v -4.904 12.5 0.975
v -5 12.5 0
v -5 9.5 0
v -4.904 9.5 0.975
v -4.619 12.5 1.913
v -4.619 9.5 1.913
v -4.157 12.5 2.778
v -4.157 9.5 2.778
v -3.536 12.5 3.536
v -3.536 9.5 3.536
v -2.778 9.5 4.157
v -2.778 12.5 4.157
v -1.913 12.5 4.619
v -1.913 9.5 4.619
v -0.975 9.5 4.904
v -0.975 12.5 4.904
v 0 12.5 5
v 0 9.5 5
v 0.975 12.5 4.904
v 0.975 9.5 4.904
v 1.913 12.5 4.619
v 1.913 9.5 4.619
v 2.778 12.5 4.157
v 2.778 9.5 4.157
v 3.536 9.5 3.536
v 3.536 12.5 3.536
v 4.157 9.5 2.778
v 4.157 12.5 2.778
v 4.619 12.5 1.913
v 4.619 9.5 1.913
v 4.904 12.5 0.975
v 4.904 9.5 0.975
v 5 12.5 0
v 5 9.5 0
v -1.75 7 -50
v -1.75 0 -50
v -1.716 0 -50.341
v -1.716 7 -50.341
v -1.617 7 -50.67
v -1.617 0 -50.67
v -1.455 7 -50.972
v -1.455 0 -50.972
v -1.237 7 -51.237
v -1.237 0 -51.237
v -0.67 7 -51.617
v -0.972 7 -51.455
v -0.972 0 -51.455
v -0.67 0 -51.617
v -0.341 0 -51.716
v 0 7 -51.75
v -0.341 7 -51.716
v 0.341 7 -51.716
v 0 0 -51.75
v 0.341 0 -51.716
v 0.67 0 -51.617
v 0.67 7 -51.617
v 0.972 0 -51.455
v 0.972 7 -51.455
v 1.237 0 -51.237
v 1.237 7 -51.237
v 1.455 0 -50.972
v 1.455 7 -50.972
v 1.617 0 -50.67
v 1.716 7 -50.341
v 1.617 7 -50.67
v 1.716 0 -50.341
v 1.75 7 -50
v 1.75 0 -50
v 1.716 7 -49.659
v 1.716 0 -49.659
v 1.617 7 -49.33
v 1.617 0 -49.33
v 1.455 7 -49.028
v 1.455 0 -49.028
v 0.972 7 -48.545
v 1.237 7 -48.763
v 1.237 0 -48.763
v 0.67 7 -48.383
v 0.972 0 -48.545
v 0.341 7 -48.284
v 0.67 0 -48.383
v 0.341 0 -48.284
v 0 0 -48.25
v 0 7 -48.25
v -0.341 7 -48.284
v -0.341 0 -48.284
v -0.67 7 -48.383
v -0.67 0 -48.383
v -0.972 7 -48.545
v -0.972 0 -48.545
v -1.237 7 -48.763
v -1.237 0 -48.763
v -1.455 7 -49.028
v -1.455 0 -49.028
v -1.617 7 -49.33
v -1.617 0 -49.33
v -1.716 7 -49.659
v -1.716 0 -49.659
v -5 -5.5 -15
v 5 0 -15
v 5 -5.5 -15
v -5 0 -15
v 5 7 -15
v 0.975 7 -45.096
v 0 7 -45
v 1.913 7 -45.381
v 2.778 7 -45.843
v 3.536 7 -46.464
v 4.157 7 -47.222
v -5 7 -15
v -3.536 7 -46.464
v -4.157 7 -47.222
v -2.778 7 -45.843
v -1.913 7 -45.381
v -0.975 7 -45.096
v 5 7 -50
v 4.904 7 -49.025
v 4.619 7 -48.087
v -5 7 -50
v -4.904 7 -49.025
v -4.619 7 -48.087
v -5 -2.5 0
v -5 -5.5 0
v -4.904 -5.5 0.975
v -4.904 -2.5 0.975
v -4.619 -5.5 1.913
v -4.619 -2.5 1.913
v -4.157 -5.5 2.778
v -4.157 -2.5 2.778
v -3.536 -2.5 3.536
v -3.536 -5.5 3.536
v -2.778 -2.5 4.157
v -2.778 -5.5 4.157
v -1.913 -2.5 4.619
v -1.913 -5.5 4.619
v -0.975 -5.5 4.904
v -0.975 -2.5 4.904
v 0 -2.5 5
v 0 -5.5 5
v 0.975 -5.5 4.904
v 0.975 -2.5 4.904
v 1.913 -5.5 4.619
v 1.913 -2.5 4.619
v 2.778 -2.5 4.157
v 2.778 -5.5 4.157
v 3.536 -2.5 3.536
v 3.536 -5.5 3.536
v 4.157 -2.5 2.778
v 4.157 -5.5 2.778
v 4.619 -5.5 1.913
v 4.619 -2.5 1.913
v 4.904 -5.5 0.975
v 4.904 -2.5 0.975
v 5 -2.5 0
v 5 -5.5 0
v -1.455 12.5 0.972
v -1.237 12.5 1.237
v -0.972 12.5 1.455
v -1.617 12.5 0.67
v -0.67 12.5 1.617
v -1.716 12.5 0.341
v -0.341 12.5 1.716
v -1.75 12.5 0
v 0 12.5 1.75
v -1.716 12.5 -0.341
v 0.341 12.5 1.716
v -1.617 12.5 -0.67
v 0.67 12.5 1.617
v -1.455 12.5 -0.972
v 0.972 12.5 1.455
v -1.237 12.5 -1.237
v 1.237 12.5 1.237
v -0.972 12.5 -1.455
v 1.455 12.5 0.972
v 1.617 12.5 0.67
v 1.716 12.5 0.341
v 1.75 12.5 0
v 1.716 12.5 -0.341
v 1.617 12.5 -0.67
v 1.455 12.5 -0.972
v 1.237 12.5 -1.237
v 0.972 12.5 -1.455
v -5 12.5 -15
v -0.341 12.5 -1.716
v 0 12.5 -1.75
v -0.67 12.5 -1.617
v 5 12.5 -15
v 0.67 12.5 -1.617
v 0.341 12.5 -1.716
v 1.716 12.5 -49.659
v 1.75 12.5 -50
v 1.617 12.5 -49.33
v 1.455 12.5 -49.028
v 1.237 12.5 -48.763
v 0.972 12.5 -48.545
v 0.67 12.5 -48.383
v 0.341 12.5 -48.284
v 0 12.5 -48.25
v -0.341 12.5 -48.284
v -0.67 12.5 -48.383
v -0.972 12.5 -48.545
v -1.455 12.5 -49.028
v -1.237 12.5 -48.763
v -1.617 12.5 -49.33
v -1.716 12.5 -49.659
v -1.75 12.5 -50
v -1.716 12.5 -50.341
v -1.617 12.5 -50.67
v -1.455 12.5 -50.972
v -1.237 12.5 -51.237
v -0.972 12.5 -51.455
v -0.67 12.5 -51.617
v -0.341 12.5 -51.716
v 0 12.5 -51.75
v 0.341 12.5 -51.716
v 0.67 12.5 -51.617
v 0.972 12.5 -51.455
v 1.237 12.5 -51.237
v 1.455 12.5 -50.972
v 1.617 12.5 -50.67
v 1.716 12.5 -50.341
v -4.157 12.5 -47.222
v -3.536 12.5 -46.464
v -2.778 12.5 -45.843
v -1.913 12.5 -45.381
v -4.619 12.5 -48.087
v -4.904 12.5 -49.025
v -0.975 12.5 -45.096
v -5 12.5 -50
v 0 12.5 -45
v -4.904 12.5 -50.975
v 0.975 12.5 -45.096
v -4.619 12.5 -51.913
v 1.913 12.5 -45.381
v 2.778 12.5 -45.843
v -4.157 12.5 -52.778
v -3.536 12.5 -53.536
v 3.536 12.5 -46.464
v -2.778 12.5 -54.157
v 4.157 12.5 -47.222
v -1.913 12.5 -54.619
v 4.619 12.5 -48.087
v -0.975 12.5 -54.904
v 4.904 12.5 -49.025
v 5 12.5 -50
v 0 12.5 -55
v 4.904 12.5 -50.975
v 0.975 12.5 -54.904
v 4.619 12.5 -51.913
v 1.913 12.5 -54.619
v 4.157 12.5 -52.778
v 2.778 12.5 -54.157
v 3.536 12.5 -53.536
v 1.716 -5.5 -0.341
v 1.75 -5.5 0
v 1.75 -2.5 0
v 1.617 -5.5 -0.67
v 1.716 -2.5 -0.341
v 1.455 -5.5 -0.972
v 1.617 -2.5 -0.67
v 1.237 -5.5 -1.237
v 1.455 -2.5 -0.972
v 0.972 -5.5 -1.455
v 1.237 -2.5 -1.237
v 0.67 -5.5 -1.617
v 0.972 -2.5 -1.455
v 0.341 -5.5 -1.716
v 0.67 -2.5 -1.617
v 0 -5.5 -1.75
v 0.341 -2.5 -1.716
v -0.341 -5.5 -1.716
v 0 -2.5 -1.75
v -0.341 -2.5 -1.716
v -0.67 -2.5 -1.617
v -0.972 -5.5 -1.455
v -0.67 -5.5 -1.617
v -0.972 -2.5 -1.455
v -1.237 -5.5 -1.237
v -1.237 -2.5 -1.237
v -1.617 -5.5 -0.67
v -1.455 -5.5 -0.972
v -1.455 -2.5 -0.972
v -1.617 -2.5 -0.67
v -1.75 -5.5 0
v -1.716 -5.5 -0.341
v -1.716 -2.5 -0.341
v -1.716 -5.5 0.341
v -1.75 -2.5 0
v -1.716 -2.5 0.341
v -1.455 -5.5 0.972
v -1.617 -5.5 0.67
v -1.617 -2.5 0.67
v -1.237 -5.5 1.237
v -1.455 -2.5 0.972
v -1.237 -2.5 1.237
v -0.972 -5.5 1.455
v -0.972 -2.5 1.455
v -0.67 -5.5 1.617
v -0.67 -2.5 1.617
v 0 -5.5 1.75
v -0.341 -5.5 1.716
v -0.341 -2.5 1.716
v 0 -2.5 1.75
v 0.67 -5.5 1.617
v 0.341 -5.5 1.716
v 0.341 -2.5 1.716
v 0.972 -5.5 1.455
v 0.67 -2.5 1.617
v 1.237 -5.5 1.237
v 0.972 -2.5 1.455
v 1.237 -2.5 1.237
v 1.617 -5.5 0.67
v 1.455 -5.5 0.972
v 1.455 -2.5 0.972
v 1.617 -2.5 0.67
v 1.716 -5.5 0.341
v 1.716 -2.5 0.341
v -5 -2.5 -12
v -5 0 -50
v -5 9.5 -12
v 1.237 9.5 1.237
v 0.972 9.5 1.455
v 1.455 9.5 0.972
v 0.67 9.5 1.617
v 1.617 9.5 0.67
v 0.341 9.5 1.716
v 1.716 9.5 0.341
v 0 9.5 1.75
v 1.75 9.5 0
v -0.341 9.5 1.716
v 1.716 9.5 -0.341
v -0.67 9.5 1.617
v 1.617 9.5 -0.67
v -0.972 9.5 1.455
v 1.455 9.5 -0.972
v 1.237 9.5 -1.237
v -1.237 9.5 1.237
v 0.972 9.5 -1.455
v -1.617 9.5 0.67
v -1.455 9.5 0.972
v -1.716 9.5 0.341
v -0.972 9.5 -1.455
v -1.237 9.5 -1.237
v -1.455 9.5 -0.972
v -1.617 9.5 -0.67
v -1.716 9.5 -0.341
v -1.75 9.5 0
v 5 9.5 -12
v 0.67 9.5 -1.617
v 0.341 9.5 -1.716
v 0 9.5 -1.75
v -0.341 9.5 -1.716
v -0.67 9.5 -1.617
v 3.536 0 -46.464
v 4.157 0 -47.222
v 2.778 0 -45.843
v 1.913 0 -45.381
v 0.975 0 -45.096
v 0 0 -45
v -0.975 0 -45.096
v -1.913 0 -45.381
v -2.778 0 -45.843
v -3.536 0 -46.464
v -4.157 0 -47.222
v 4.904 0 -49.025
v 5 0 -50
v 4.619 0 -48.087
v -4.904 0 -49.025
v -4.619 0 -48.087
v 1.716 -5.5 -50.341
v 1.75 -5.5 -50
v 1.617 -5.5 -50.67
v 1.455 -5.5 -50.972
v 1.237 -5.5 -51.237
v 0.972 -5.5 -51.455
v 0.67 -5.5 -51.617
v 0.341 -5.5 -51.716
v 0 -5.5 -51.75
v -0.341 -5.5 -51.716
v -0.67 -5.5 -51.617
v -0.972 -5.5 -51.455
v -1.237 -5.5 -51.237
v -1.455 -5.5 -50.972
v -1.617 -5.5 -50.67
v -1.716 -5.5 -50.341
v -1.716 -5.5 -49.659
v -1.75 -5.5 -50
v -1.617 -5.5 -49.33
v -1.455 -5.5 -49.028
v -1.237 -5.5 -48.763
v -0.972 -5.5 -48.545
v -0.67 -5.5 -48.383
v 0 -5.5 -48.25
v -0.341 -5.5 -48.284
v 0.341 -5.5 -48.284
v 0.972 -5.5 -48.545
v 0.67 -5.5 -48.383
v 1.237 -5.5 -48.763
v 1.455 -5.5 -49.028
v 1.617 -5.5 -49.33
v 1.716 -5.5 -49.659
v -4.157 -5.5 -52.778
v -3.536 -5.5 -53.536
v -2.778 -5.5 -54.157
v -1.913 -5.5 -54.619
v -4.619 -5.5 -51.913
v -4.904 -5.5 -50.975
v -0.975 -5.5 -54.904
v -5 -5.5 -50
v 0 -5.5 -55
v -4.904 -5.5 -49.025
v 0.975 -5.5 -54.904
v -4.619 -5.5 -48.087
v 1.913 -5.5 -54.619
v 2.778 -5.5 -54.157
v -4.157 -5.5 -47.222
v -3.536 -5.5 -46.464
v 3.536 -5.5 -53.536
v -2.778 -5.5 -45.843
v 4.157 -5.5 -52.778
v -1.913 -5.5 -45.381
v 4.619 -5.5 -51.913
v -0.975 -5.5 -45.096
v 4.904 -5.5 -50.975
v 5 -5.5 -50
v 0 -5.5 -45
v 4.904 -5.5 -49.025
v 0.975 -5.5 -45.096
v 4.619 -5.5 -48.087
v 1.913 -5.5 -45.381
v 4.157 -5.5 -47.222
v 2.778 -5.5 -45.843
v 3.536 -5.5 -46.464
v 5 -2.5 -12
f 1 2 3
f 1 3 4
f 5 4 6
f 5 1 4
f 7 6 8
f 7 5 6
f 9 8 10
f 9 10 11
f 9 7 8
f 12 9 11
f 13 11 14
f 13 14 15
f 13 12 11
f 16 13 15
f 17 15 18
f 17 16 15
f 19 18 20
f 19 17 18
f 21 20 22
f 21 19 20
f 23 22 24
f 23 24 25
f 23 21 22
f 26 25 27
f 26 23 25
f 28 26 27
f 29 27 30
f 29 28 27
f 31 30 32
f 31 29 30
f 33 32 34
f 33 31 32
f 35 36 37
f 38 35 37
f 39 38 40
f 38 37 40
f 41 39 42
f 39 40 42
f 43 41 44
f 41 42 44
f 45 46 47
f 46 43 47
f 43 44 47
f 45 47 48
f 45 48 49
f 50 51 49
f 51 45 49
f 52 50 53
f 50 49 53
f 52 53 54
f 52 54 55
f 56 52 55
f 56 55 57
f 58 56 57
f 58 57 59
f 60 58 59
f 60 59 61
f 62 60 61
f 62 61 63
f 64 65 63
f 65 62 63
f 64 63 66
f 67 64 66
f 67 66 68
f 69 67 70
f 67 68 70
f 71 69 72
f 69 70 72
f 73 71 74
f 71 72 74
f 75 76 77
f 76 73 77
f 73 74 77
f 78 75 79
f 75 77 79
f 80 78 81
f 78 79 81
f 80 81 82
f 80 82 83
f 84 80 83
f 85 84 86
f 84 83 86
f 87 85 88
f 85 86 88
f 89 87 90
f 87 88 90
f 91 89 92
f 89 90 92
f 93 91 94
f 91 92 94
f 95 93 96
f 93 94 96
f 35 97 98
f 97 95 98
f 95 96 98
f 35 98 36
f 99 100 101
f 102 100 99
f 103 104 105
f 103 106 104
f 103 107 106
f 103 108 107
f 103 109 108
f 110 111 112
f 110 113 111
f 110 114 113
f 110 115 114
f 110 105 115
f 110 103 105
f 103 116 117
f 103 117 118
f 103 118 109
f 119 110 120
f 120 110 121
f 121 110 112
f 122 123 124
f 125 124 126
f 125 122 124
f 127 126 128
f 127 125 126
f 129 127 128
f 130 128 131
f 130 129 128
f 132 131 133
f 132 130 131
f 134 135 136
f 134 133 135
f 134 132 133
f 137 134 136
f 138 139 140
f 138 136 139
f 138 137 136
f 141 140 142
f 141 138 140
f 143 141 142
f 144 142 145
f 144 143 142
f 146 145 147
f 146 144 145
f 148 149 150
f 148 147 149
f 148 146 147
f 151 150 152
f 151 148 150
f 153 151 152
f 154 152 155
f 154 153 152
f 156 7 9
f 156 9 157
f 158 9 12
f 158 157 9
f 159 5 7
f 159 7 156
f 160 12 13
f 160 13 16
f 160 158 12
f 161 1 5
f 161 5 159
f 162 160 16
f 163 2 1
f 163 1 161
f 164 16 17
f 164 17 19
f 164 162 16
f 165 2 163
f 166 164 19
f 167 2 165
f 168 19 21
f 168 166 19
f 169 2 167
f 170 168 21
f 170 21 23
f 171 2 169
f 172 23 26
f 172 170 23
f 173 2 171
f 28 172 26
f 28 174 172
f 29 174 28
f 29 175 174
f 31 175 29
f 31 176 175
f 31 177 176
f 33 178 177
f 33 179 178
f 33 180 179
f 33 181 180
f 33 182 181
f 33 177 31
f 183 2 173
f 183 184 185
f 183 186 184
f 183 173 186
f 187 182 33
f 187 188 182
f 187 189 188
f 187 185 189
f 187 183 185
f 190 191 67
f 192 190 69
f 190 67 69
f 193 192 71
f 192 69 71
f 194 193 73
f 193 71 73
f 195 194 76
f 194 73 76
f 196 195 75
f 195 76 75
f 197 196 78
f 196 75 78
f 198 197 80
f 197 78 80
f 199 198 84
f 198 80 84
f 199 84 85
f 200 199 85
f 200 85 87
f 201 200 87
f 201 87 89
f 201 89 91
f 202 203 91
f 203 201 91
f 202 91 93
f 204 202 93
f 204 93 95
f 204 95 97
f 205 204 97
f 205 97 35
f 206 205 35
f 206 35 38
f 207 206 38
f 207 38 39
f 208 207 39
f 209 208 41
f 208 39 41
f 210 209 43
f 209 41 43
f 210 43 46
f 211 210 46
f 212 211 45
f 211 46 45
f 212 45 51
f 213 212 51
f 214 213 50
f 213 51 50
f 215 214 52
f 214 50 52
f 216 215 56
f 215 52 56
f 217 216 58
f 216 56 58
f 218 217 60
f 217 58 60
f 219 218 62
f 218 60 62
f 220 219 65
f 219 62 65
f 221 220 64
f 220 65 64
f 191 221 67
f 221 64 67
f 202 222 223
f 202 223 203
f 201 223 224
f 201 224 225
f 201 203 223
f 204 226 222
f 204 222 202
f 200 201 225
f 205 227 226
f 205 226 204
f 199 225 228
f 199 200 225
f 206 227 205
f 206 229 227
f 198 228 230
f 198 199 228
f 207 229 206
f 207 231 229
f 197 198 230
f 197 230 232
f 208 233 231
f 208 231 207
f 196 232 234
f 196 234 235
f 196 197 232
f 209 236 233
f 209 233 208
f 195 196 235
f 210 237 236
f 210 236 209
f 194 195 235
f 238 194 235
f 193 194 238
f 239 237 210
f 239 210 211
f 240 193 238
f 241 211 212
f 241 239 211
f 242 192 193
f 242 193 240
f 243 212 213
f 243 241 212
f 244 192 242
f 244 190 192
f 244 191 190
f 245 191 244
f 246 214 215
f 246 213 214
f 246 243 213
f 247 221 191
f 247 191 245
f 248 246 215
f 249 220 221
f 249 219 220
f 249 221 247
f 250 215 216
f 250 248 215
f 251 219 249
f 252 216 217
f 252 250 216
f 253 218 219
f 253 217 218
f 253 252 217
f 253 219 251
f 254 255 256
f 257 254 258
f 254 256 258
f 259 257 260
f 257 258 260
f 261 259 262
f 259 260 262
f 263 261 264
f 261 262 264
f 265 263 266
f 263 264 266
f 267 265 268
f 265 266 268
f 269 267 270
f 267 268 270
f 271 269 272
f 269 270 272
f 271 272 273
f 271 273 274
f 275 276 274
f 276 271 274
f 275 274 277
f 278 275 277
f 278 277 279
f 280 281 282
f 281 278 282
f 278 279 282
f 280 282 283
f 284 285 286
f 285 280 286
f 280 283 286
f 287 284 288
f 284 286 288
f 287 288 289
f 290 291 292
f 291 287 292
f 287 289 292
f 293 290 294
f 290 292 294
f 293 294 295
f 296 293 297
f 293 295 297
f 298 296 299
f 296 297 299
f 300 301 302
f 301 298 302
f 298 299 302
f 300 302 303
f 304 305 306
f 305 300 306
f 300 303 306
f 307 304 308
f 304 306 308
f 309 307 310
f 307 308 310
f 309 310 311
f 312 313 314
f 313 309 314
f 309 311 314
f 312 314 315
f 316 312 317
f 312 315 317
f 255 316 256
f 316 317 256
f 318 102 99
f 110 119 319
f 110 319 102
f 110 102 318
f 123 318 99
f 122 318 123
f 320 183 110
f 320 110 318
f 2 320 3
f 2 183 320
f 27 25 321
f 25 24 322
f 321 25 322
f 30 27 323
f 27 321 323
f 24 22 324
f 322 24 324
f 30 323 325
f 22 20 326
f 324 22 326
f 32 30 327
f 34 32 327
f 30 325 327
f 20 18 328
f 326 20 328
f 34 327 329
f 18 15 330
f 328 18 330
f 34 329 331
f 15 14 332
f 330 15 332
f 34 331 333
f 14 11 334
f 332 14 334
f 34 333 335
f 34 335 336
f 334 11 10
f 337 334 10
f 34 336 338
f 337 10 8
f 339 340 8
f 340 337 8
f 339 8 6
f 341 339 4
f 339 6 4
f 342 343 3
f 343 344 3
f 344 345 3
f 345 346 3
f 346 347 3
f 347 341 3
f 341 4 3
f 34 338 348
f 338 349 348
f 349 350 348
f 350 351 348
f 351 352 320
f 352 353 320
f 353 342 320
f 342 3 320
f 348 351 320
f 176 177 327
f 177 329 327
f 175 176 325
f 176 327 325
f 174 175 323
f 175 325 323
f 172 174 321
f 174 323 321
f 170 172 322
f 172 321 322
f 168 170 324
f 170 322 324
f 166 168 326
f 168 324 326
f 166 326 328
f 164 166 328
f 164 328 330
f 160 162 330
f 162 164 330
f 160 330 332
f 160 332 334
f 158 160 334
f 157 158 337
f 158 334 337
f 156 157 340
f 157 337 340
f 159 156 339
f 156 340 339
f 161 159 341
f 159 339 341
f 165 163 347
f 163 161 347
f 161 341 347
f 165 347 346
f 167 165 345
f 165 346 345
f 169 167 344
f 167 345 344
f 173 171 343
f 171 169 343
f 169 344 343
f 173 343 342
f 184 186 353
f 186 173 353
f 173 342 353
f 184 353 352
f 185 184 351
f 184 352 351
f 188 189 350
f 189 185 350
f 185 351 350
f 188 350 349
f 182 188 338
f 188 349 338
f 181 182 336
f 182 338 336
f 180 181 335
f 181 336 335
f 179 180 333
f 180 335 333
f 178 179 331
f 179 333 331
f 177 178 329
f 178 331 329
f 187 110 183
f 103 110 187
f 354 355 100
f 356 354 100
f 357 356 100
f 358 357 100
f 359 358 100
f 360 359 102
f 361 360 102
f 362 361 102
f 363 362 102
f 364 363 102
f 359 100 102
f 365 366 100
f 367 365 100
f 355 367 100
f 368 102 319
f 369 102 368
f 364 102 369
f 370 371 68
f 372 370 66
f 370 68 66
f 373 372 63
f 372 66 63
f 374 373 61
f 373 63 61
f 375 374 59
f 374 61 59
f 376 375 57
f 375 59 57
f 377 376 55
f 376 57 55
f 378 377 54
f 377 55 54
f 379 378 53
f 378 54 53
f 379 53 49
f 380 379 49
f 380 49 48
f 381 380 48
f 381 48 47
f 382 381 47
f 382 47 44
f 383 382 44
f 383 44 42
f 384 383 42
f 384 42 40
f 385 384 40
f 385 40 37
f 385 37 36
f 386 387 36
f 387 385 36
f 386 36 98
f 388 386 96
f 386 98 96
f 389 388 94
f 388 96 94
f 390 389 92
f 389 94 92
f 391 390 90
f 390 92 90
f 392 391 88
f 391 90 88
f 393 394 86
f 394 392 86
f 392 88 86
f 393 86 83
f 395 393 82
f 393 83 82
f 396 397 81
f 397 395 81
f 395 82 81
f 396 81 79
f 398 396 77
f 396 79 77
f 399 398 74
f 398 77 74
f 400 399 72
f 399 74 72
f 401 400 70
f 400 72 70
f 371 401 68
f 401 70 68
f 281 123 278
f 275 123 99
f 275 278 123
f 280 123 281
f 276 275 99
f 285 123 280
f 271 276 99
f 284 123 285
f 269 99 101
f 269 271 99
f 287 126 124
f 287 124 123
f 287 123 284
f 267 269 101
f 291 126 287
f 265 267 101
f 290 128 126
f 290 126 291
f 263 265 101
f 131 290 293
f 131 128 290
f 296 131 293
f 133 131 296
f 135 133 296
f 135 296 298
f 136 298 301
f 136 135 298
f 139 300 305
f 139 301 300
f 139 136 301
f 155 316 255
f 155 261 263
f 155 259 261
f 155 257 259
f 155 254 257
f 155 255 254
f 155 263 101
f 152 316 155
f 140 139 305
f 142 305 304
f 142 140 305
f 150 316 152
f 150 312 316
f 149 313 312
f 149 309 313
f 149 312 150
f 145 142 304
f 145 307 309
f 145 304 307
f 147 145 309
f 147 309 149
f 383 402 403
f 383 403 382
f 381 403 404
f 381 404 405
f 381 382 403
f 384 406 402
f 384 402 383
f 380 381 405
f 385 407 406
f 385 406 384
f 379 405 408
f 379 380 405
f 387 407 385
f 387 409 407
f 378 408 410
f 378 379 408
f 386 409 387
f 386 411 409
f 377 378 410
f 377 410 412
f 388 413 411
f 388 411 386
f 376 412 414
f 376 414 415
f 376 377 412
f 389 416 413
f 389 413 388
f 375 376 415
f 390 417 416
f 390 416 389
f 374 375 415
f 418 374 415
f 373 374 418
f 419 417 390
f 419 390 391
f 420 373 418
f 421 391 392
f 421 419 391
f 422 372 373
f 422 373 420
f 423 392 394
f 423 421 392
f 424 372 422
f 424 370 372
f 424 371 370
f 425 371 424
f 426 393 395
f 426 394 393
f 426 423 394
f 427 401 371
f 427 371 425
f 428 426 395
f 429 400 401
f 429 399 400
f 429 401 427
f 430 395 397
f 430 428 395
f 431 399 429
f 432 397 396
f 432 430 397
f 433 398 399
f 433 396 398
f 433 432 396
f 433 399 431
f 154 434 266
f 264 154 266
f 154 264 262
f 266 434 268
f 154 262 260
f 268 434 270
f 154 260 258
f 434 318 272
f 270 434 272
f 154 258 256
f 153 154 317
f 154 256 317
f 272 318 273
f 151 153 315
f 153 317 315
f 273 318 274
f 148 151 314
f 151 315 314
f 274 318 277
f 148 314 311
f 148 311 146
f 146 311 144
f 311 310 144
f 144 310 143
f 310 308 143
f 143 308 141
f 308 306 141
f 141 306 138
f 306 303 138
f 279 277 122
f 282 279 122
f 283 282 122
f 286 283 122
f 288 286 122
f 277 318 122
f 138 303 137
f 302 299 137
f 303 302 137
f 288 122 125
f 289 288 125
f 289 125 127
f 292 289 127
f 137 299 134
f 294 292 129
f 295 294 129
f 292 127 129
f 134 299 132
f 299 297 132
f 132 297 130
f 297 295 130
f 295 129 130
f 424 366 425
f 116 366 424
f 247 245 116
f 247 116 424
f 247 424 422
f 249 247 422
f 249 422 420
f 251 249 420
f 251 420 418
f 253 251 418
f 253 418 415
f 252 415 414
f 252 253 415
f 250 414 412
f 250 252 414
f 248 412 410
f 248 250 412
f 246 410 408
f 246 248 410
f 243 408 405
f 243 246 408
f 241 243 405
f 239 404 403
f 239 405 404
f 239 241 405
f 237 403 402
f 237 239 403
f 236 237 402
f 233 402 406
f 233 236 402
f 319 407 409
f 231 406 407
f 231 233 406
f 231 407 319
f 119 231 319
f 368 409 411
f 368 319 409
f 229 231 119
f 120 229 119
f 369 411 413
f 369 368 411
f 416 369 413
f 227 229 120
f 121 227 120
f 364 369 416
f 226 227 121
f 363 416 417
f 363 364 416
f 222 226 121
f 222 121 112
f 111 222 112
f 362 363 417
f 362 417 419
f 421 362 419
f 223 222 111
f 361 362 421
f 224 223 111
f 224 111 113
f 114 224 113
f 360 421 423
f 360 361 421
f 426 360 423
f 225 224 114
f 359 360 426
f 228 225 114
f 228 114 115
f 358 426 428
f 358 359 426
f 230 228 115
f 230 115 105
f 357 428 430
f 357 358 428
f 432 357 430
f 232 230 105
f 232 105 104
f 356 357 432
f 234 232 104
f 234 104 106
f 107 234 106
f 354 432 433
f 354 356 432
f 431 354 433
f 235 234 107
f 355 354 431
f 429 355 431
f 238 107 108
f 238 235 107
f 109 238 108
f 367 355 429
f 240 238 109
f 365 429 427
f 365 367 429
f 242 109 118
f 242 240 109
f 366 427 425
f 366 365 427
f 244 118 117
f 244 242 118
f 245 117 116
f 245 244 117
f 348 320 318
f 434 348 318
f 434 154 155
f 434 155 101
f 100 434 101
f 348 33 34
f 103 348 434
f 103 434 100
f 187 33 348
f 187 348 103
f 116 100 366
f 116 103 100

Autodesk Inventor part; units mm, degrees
ref_plane "YZ Plane" through (0, 0, 0) normal (1, 0, 0) x (0, 1, 0)
ref_plane "XY Plane" through (0, 0, 0) normal (0, 0, 1) x (1, 0, 0)
sketch "草圖1" plane through (0, 0, 0) normal (0, 1, 0) x (-1, 0, 0)
  circle A0 centre (0, 0) radius 1.75
  arc A1 (5, 0) -> (-5, 0) centre (0, 0) ccw
  circle A2 centre (0, -50) radius 1.75
  arc A3 (-5, -50) -> (5, -50) centre (0, -50) ccw
  line L0 (5, 0) -> (5, -50)
  line L1 (-5, 0) -> (-5, -50)
  dimension "d1" = 3.5
  dimension "d2" = 10
  dimension "d3" = 3.5
  dimension "d4" = 10
  dimension "d36" = 50
extrude "擠出1" add sketch "草圖1" along normal blind 7
sketch "草圖2" plane through (0, 7, 0) normal (0, 1, 0) x (1, 0, 0)
  line L0 (0, 0) -> (0, 15) construction
  line L1 (-5, 50) -> (-5, 0) projected
  line L2 (5, 0) -> (5, 50) projected
  arc A0 (-5, 0) -> (5, 0) centre (0, 0) ccw projected
  circle A1 centre (0, 0) radius 1.75 projected
  line L3 (-5, 15) -> (5, 15)
  point P0 (-5, 9)
  point P1 (5, 9)
  dimension "d7" = 15
sketch "草圖3" plane through (0, 0, 0) normal (0, -1, 0) x (1, 0, 0)
  line L0 (-5, -9) -> (5, -9) projected
  arc A0 (5, 0) -> (-5, 0) centre (0, 0) ccw projected
  line L1 (-5, -50) -> (-5, 0) projected
  circle A1 centre (0, 0) radius 1.75 projected
  line L2 (5, 0) -> (5, -50) projected
extrude "擠出2" add sketch "草圖2" along normal blind 5.5
sketch "草圖5" plane through (0, 7, 0) normal (0, 1, 0) x (1, 0, 0)
  circle A0 centre (0, 50) radius 1.75 projected
  circle A1 centre (0, 50) radius 5
  point P0 (0, 0)
  dimension "d17" = 10
extrude "擠出5" add sketch "草圖5" along normal blind 5.5
sketch "草圖6" plane through (0, 0, 0) normal (0, -1, 0) x (1, 0, 0)
  circle A0 centre (0, -50) radius 1.75 projected
  circle A1 centre (0, -50) radius 5
  point P0 (0, 0)
  dimension "d20" = 10
extrude "擠出6" add sketch "草圖6" along normal blind 5.5
sketch "草圖9" plane through (0, 0, 0) normal (0, -1, 0) x (1, 0, 0)
  circle A0 centre (0, 0) radius 1.75 projected
  circle A1 centre (0, 0) radius 1.75 projected
  line L0 (-5, -15) -> (-5, 0) projected
  arc A2 (5, 0) -> (-5, 0) centre (0, 0) ccw projected
  line L1 (5, 0) -> (5, -15) projected
  line L2 (5, -15) -> (-5, -15) projected
extrude "擠出7" add sketch "草圖9" along normal blind 5.5
sketch "草圖10" plane through (-5, 0, -50) normal (-1, 0, 0) x (0, 0, 1)
  line L0 (55, 12.5) -> (50, 12.5) construction
  line L1 (55, 12.5) -> (55, 9.5) construction
  line L2 (55, -5.5) -> (55, 12.5) construction
  line L3 (55, 9.5) -> (38, 9.5)
  line L4 (38, 9.5) -> (38, -2.5)
  line L5 (38, -2.5) -> (55, -2.5)
  line L6 (55, 9.5) -> (55, -2.5)
  point P0 (50, 0)
  dimension "d25" = 3
  dimension "d26" = 17
  dimension "d27" = 12
extrude "擠出8" cut sketch "草圖10" against normal up to next
ref_plane "工作平面1" through (0, 3.5, 0) normal (0, 1, 0) x (-1, 0, 0)
sketch "草圖11" plane through (0, 3.5, 0) normal (0, 1, 0) x (-1, 0, 0)
  circle A0 centre (0, 0) radius 1.75 projected
  line L0 (5, -15) -> (5, 0) projected
  arc A1 (5, 0) -> (-5, 0) centre (0, 0) ccw projected
  line L1 (-5, 0) -> (-5, -15) projected
  line L2 (-5, -15) -> (5, -15) projected
  arc A2 (5, -50) -> (-5, -50) centre (0, -50) ccw projected
  line L3 (5, -50) -> (5, -15) projected
  line L4 (5, -15) -> (-5, -15) projected
  line L5 (-5, -15) -> (-5, -50) projected
  circle A3 centre (0, -50) radius 1.75 projected
  circle A4 centre (0, -50) radius 5 projected
  dimension "d35" = 50
properties part number "筷子套軸"
